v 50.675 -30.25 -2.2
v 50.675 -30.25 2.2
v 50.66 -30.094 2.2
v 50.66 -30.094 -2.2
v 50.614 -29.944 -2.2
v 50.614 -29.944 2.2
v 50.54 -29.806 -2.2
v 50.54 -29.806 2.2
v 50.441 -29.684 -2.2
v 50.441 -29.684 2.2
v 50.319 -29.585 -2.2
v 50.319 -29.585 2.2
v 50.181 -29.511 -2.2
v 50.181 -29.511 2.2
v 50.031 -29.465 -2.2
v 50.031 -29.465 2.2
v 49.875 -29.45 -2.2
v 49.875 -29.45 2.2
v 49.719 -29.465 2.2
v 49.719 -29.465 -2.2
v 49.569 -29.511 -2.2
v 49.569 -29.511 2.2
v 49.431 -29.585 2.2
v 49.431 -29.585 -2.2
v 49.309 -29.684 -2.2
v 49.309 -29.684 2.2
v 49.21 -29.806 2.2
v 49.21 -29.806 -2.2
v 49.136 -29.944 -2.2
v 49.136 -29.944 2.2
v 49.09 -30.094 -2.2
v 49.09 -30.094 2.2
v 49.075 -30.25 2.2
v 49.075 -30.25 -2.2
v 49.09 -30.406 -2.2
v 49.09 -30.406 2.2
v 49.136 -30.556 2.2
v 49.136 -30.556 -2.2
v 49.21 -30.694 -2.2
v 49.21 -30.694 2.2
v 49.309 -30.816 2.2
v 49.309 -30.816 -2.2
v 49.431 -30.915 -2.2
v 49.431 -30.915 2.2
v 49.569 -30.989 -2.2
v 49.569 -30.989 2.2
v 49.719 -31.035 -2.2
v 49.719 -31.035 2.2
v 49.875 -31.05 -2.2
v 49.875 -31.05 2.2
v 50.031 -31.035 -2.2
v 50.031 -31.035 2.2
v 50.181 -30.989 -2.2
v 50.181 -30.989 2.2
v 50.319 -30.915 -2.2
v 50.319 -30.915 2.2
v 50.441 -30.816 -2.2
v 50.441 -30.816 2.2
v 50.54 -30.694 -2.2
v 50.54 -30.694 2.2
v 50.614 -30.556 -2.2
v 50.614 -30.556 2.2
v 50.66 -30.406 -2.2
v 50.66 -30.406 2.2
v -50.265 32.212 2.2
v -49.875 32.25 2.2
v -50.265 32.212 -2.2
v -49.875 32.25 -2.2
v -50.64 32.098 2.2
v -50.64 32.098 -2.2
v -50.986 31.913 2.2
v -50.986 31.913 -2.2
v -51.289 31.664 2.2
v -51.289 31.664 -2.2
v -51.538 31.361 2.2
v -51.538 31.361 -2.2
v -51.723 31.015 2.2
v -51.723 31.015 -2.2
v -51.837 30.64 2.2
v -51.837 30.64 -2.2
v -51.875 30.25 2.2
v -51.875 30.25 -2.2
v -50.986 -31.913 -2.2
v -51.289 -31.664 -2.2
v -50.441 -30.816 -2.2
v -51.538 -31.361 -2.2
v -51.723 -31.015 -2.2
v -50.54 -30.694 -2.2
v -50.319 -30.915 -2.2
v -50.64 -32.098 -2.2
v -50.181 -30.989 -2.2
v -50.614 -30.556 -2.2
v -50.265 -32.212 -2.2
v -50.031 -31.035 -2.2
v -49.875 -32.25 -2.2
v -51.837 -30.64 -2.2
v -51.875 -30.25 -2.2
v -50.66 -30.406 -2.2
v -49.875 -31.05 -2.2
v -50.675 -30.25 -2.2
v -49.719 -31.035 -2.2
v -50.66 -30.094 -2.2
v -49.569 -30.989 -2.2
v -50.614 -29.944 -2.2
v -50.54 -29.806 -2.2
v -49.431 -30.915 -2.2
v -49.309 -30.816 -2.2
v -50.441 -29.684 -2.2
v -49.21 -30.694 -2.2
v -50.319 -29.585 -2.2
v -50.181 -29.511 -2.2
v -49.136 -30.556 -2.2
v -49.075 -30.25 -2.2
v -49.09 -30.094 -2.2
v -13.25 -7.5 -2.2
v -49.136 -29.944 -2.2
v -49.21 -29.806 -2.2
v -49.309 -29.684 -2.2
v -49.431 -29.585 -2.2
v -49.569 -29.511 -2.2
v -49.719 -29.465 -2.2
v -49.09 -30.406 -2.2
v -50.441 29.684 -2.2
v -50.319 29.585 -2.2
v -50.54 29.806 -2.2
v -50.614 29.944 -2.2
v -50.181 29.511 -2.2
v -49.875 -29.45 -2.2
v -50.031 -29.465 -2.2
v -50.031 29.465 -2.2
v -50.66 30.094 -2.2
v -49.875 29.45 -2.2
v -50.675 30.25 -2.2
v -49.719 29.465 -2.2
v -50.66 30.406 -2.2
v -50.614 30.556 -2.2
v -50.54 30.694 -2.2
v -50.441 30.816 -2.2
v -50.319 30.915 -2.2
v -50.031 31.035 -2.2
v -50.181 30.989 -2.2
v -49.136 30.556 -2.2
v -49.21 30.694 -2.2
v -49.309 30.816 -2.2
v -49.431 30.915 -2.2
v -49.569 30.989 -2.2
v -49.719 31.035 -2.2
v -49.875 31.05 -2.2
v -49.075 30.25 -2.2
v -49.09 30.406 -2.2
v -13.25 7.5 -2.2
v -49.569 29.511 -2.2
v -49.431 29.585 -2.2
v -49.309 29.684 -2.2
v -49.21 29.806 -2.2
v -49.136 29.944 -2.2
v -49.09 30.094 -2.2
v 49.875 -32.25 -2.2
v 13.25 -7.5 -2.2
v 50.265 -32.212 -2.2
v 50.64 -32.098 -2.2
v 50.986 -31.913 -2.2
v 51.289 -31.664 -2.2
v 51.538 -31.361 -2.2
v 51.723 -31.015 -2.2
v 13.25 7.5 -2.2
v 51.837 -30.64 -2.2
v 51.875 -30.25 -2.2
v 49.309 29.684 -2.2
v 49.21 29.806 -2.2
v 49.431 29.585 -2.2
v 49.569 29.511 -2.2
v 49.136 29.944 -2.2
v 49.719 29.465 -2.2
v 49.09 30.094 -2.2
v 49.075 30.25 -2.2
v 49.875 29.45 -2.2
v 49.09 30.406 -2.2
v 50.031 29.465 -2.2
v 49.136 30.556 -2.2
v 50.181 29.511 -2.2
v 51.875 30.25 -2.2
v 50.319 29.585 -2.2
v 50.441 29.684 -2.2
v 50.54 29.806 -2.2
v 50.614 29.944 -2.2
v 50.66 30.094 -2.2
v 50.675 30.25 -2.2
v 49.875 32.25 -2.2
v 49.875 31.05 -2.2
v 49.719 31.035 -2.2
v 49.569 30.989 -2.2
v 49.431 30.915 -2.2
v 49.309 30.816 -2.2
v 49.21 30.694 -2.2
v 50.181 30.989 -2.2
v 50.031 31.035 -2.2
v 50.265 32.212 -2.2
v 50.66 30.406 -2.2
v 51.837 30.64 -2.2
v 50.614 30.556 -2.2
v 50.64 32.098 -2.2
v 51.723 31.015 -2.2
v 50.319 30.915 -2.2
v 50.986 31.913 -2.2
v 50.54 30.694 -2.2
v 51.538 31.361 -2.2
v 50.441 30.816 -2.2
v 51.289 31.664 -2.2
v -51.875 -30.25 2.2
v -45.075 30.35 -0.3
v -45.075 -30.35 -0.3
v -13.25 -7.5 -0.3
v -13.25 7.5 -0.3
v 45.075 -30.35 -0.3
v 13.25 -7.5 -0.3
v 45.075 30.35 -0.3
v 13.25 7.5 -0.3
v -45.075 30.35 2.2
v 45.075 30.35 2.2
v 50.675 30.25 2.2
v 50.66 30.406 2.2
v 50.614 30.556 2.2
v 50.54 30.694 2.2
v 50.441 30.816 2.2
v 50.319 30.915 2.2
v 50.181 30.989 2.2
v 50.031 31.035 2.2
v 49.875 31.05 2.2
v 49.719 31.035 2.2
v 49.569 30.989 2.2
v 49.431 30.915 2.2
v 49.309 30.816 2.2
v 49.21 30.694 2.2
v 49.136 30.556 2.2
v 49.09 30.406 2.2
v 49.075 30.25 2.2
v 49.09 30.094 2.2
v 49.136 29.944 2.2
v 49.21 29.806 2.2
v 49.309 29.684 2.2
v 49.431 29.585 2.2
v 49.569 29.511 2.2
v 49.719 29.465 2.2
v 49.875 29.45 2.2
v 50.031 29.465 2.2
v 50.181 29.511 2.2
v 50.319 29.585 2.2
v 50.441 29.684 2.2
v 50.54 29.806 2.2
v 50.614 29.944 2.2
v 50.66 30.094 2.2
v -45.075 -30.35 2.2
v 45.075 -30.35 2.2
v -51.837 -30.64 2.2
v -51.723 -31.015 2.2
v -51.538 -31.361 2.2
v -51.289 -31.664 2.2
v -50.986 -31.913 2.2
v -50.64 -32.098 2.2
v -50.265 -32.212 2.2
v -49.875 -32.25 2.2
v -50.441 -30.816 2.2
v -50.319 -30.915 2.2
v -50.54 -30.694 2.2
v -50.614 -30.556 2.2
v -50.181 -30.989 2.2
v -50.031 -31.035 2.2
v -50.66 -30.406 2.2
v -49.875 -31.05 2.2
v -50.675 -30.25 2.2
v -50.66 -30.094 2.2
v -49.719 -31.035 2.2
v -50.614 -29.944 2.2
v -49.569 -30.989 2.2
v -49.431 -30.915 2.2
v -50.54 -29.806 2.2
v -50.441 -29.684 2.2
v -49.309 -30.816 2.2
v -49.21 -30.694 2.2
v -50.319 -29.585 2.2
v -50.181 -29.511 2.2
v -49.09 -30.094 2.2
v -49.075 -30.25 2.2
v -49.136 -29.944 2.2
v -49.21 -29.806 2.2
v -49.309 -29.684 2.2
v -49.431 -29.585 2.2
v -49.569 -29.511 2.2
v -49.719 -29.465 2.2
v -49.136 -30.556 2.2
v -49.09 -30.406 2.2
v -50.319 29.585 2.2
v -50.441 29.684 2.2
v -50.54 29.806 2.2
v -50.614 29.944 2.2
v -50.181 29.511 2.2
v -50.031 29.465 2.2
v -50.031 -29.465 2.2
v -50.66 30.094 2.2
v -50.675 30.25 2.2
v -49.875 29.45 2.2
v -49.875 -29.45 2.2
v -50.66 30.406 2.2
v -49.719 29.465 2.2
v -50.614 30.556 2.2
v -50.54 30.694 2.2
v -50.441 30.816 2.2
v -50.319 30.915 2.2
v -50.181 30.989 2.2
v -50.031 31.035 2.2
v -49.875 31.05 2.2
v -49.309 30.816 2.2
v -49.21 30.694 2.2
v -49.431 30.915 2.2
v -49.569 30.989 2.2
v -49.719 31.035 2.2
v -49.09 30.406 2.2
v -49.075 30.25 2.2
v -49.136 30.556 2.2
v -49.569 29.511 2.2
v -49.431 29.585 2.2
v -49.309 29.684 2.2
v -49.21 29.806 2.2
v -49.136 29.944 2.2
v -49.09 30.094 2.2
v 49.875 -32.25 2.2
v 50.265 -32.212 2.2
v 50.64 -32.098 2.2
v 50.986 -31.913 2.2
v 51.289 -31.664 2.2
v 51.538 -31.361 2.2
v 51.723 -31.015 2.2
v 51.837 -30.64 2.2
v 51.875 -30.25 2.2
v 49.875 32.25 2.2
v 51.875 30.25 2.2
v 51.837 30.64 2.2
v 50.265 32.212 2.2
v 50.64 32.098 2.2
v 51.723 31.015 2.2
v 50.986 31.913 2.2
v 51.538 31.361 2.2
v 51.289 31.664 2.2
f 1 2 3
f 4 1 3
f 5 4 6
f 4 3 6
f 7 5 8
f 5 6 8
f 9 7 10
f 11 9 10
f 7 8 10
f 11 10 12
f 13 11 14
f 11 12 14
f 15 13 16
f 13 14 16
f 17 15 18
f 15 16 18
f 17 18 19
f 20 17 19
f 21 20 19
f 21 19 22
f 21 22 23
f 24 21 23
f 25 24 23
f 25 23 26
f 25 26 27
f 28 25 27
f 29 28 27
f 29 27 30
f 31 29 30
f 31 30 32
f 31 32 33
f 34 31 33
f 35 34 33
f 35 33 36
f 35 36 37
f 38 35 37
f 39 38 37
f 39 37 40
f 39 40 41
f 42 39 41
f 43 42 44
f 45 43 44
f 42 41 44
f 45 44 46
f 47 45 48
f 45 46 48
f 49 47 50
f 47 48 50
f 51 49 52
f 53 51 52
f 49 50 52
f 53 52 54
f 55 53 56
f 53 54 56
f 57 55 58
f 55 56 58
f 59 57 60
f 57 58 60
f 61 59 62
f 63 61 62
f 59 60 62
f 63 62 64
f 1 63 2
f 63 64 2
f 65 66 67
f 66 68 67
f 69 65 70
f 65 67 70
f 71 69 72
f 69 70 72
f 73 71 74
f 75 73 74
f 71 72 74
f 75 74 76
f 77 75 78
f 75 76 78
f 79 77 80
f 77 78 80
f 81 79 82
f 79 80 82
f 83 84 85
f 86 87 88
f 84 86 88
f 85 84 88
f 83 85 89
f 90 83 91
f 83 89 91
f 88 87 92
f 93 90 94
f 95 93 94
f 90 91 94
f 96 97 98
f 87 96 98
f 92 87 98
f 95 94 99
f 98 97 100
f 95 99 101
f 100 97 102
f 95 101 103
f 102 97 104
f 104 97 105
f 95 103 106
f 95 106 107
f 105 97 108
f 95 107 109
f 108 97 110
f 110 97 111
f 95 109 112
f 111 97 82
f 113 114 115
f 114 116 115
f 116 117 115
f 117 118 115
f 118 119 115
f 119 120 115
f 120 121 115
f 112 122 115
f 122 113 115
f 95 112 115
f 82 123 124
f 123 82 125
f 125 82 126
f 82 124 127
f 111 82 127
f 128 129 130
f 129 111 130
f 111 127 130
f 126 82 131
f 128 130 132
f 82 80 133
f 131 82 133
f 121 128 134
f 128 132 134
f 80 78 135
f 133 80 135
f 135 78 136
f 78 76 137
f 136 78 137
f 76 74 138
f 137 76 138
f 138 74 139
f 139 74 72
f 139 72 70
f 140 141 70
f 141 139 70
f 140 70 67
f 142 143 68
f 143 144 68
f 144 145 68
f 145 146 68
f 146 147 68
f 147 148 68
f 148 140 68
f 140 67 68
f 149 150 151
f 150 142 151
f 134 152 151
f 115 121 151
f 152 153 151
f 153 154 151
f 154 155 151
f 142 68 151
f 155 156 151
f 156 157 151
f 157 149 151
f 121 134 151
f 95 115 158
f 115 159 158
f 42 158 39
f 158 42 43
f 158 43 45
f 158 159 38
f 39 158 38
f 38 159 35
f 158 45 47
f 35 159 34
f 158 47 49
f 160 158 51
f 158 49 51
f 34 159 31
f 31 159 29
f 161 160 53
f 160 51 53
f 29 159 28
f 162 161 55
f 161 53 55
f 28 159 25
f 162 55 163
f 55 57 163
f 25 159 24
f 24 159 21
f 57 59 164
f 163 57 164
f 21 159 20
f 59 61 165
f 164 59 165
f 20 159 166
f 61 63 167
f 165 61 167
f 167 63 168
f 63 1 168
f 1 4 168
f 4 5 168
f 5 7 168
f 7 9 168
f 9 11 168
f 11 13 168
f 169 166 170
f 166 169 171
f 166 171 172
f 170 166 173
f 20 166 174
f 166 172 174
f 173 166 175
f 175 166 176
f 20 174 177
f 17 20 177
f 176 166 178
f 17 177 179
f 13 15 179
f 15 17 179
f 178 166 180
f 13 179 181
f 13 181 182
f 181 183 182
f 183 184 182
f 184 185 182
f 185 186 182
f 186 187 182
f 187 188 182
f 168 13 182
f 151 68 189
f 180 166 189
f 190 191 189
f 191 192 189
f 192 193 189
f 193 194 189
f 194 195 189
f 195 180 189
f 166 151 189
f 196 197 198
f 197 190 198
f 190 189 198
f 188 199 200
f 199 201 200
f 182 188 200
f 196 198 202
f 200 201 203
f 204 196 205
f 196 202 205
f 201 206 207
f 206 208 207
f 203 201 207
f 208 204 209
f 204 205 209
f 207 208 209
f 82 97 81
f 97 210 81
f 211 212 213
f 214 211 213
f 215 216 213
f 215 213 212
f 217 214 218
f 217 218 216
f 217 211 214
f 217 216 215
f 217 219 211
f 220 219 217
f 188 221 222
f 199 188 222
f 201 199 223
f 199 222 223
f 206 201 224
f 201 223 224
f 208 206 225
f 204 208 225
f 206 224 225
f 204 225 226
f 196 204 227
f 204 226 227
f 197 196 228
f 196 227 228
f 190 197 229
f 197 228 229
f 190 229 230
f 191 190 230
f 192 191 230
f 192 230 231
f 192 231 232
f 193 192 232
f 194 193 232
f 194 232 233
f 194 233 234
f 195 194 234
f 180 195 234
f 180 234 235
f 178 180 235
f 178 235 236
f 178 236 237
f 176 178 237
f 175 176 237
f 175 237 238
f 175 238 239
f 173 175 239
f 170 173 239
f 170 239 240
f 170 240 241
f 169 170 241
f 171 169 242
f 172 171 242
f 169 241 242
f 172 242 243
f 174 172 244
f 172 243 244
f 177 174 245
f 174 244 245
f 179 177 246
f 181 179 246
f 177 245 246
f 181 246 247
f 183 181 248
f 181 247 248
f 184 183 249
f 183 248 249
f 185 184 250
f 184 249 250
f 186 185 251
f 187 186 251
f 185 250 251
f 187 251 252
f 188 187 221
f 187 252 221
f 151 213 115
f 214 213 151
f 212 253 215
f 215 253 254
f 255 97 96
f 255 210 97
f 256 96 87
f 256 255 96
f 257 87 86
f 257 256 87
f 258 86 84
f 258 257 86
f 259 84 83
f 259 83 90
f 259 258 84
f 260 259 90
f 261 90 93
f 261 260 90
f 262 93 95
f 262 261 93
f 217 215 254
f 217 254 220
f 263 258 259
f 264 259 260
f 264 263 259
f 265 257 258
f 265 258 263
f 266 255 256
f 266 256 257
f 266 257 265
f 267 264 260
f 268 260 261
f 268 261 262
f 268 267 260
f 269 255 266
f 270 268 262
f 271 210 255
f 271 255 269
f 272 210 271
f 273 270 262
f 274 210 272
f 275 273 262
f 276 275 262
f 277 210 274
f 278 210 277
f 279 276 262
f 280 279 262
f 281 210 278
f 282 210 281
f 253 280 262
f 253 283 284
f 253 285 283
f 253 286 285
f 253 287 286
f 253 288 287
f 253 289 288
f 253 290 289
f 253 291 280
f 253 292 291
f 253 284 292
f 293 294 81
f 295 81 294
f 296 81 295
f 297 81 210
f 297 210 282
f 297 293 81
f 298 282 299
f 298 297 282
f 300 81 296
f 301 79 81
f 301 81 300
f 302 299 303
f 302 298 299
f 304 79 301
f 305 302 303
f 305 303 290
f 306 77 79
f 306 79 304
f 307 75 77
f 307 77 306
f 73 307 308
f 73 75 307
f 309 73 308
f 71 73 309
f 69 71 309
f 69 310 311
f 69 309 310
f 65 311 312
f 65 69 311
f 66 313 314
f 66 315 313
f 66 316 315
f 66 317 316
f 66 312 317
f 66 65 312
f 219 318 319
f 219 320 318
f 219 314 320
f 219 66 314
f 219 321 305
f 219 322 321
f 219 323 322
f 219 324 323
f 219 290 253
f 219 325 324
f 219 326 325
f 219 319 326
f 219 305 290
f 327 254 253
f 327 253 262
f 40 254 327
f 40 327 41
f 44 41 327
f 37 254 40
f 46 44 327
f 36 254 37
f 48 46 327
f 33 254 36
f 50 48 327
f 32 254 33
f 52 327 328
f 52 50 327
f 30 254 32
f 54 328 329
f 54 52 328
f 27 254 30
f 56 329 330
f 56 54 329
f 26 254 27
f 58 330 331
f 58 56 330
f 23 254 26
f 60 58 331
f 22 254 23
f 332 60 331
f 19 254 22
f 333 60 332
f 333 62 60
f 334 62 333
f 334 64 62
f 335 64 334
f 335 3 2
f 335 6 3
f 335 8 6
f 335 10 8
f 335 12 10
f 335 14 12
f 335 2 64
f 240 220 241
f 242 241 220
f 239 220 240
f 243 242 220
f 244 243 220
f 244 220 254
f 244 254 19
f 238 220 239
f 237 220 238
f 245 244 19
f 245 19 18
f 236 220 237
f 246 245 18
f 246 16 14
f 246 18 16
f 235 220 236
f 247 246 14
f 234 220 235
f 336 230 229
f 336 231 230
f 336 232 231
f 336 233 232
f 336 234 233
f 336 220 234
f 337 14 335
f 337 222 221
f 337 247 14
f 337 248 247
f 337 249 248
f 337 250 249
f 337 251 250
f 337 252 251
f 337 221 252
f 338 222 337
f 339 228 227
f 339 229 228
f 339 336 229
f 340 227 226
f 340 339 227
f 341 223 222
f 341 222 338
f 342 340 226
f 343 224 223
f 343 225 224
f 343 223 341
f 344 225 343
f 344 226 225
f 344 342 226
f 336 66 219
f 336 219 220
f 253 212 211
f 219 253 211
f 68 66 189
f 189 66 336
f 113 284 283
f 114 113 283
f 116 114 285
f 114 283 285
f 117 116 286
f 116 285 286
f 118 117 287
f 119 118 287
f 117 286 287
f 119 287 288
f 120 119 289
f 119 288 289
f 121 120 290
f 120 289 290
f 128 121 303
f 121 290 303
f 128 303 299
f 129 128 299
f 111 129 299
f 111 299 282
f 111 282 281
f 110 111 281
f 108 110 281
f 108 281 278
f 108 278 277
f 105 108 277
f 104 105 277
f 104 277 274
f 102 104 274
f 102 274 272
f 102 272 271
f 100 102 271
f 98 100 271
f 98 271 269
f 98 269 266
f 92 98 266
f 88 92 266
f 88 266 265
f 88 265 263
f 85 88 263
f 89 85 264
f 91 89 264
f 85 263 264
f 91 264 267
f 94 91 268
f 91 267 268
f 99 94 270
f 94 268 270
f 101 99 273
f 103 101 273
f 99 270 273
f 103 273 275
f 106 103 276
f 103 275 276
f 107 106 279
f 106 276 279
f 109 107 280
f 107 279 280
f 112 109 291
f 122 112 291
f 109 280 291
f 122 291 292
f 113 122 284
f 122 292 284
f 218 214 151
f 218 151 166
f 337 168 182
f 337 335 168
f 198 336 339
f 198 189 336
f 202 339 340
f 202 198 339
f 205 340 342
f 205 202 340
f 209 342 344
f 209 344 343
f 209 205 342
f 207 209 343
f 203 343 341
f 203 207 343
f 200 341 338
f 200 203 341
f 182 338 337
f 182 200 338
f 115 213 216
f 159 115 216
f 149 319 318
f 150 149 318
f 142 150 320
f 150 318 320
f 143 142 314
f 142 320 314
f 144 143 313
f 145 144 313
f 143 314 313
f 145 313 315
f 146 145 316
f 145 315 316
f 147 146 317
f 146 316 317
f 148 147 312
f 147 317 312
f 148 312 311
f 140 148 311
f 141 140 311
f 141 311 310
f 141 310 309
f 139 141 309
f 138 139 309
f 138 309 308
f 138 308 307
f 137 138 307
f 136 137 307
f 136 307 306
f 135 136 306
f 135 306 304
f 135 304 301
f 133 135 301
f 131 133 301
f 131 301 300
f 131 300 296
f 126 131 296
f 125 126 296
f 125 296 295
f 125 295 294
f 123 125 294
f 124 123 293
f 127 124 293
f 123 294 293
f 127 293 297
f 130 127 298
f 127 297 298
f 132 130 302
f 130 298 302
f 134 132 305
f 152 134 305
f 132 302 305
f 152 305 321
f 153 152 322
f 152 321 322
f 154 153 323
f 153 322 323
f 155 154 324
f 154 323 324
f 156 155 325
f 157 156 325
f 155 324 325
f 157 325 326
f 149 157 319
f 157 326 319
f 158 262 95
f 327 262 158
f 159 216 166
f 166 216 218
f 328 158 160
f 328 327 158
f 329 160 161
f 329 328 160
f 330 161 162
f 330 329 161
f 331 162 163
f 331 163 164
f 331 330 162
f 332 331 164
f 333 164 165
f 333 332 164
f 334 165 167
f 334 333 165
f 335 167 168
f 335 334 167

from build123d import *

# Parameters (mm, degrees)
F0_W      = 103.75
F0_H      = 64.5
F1_DEPTH  = 2.2
F2_T      = -1.9
F3_W      = 26.5
F3_H      = 15
F4_DEPTH  = 12.7
F5_R      = 2
F6_R      = 2
F7_W      = 4.9
F7_H      = 60.7
F8_DEPTH  = 2.5
F9_W      = 4.9
F9_H      = 60.7
F10_DEPTH = 2.5
F11_R     = 0.8
F12_DEPTH = 25.4
F13_R     = 0.8
F14_DEPTH = 25.4
F15_R     = 0.8
F16_DEPTH = 25.4
F17_R     = 0.8
F18_DEPTH = 25.4


with BuildPart() as f1:
    # F0 (on Top) → F1 (new body, symmetric)
    with BuildSketch(Plane.XY):
        Rectangle(F0_W, F0_H)
    extrude(amount=F1_DEPTH, both=True)

    # F2
    f2_openings = [f1.faces().sort_by_distance(p)[0] for p in [
        (0, 0, 2.2),
    ]]
    offset(amount=F2_T, openings=f2_openings)

    # F3 (on Top) → F4 (cut, symmetric)
    with BuildSketch(Plane.XY):
        Rectangle(F3_W, F3_H)
    extrude(amount=F4_DEPTH, both=True, mode=Mode.SUBTRACT)

    # F5
    f5_edges = [f1.edges().sort_by_distance(p)[0] for p in [
        (-51.875, 32.25, 0),
    ]]
    fillet(f5_edges, radius=F5_R)

    # F6
    f6_edges = [f1.edges().sort_by_distance(p)[0] for p in [
        (-51.875, -32.25, 0),
        (51.875, -32.25, 0),
        (51.875, 32.25, 0),
    ]]
    fillet(f6_edges, radius=F6_R)

    # F7 (on face) → F8 (join)
    with BuildSketch(Plane.XY.offset(-0.3)):
        with Locations((-47.525, 0)):
            Rectangle(F7_W, F7_H)
    extrude(amount=F8_DEPTH)

    # F9 (on face) → F10 (join)
    with BuildSketch(Plane.XY.offset(-0.3)):
        with Locations((47.525, 0)):
            Rectangle(F9_W, F9_H)
    extrude(amount=F10_DEPTH)

    # F11 (on face) → F12 (cut)
    with BuildSketch(Plane.XY.offset(2.2)):
        with Locations((49.875, -30.25)):
            Circle(F11_R)
    extrude(amount=-F12_DEPTH, mode=Mode.SUBTRACT)

    # F13 (on face) → F14 (cut)
    with BuildSketch(Plane.XY.offset(2.2)):
        with Locations((49.875, 30.25)):
            Circle(F13_R)
    extrude(amount=-F14_DEPTH, mode=Mode.SUBTRACT)

    # F15 (on face) → F16 (cut)
    with BuildSketch(Plane.XY.offset(2.2)):
        with Locations((-49.875, -30.25)):
            Circle(F15_R)
    extrude(amount=-F16_DEPTH, mode=Mode.SUBTRACT)

    # F17 (on face) → F18 (cut)
    with BuildSketch(Plane.XY.offset(2.2)):
        with Locations((-49.875, 30.25)):
            Circle(F17_R)
    extrude(amount=-F18_DEPTH, mode=Mode.SUBTRACT)


solid = f1.part
